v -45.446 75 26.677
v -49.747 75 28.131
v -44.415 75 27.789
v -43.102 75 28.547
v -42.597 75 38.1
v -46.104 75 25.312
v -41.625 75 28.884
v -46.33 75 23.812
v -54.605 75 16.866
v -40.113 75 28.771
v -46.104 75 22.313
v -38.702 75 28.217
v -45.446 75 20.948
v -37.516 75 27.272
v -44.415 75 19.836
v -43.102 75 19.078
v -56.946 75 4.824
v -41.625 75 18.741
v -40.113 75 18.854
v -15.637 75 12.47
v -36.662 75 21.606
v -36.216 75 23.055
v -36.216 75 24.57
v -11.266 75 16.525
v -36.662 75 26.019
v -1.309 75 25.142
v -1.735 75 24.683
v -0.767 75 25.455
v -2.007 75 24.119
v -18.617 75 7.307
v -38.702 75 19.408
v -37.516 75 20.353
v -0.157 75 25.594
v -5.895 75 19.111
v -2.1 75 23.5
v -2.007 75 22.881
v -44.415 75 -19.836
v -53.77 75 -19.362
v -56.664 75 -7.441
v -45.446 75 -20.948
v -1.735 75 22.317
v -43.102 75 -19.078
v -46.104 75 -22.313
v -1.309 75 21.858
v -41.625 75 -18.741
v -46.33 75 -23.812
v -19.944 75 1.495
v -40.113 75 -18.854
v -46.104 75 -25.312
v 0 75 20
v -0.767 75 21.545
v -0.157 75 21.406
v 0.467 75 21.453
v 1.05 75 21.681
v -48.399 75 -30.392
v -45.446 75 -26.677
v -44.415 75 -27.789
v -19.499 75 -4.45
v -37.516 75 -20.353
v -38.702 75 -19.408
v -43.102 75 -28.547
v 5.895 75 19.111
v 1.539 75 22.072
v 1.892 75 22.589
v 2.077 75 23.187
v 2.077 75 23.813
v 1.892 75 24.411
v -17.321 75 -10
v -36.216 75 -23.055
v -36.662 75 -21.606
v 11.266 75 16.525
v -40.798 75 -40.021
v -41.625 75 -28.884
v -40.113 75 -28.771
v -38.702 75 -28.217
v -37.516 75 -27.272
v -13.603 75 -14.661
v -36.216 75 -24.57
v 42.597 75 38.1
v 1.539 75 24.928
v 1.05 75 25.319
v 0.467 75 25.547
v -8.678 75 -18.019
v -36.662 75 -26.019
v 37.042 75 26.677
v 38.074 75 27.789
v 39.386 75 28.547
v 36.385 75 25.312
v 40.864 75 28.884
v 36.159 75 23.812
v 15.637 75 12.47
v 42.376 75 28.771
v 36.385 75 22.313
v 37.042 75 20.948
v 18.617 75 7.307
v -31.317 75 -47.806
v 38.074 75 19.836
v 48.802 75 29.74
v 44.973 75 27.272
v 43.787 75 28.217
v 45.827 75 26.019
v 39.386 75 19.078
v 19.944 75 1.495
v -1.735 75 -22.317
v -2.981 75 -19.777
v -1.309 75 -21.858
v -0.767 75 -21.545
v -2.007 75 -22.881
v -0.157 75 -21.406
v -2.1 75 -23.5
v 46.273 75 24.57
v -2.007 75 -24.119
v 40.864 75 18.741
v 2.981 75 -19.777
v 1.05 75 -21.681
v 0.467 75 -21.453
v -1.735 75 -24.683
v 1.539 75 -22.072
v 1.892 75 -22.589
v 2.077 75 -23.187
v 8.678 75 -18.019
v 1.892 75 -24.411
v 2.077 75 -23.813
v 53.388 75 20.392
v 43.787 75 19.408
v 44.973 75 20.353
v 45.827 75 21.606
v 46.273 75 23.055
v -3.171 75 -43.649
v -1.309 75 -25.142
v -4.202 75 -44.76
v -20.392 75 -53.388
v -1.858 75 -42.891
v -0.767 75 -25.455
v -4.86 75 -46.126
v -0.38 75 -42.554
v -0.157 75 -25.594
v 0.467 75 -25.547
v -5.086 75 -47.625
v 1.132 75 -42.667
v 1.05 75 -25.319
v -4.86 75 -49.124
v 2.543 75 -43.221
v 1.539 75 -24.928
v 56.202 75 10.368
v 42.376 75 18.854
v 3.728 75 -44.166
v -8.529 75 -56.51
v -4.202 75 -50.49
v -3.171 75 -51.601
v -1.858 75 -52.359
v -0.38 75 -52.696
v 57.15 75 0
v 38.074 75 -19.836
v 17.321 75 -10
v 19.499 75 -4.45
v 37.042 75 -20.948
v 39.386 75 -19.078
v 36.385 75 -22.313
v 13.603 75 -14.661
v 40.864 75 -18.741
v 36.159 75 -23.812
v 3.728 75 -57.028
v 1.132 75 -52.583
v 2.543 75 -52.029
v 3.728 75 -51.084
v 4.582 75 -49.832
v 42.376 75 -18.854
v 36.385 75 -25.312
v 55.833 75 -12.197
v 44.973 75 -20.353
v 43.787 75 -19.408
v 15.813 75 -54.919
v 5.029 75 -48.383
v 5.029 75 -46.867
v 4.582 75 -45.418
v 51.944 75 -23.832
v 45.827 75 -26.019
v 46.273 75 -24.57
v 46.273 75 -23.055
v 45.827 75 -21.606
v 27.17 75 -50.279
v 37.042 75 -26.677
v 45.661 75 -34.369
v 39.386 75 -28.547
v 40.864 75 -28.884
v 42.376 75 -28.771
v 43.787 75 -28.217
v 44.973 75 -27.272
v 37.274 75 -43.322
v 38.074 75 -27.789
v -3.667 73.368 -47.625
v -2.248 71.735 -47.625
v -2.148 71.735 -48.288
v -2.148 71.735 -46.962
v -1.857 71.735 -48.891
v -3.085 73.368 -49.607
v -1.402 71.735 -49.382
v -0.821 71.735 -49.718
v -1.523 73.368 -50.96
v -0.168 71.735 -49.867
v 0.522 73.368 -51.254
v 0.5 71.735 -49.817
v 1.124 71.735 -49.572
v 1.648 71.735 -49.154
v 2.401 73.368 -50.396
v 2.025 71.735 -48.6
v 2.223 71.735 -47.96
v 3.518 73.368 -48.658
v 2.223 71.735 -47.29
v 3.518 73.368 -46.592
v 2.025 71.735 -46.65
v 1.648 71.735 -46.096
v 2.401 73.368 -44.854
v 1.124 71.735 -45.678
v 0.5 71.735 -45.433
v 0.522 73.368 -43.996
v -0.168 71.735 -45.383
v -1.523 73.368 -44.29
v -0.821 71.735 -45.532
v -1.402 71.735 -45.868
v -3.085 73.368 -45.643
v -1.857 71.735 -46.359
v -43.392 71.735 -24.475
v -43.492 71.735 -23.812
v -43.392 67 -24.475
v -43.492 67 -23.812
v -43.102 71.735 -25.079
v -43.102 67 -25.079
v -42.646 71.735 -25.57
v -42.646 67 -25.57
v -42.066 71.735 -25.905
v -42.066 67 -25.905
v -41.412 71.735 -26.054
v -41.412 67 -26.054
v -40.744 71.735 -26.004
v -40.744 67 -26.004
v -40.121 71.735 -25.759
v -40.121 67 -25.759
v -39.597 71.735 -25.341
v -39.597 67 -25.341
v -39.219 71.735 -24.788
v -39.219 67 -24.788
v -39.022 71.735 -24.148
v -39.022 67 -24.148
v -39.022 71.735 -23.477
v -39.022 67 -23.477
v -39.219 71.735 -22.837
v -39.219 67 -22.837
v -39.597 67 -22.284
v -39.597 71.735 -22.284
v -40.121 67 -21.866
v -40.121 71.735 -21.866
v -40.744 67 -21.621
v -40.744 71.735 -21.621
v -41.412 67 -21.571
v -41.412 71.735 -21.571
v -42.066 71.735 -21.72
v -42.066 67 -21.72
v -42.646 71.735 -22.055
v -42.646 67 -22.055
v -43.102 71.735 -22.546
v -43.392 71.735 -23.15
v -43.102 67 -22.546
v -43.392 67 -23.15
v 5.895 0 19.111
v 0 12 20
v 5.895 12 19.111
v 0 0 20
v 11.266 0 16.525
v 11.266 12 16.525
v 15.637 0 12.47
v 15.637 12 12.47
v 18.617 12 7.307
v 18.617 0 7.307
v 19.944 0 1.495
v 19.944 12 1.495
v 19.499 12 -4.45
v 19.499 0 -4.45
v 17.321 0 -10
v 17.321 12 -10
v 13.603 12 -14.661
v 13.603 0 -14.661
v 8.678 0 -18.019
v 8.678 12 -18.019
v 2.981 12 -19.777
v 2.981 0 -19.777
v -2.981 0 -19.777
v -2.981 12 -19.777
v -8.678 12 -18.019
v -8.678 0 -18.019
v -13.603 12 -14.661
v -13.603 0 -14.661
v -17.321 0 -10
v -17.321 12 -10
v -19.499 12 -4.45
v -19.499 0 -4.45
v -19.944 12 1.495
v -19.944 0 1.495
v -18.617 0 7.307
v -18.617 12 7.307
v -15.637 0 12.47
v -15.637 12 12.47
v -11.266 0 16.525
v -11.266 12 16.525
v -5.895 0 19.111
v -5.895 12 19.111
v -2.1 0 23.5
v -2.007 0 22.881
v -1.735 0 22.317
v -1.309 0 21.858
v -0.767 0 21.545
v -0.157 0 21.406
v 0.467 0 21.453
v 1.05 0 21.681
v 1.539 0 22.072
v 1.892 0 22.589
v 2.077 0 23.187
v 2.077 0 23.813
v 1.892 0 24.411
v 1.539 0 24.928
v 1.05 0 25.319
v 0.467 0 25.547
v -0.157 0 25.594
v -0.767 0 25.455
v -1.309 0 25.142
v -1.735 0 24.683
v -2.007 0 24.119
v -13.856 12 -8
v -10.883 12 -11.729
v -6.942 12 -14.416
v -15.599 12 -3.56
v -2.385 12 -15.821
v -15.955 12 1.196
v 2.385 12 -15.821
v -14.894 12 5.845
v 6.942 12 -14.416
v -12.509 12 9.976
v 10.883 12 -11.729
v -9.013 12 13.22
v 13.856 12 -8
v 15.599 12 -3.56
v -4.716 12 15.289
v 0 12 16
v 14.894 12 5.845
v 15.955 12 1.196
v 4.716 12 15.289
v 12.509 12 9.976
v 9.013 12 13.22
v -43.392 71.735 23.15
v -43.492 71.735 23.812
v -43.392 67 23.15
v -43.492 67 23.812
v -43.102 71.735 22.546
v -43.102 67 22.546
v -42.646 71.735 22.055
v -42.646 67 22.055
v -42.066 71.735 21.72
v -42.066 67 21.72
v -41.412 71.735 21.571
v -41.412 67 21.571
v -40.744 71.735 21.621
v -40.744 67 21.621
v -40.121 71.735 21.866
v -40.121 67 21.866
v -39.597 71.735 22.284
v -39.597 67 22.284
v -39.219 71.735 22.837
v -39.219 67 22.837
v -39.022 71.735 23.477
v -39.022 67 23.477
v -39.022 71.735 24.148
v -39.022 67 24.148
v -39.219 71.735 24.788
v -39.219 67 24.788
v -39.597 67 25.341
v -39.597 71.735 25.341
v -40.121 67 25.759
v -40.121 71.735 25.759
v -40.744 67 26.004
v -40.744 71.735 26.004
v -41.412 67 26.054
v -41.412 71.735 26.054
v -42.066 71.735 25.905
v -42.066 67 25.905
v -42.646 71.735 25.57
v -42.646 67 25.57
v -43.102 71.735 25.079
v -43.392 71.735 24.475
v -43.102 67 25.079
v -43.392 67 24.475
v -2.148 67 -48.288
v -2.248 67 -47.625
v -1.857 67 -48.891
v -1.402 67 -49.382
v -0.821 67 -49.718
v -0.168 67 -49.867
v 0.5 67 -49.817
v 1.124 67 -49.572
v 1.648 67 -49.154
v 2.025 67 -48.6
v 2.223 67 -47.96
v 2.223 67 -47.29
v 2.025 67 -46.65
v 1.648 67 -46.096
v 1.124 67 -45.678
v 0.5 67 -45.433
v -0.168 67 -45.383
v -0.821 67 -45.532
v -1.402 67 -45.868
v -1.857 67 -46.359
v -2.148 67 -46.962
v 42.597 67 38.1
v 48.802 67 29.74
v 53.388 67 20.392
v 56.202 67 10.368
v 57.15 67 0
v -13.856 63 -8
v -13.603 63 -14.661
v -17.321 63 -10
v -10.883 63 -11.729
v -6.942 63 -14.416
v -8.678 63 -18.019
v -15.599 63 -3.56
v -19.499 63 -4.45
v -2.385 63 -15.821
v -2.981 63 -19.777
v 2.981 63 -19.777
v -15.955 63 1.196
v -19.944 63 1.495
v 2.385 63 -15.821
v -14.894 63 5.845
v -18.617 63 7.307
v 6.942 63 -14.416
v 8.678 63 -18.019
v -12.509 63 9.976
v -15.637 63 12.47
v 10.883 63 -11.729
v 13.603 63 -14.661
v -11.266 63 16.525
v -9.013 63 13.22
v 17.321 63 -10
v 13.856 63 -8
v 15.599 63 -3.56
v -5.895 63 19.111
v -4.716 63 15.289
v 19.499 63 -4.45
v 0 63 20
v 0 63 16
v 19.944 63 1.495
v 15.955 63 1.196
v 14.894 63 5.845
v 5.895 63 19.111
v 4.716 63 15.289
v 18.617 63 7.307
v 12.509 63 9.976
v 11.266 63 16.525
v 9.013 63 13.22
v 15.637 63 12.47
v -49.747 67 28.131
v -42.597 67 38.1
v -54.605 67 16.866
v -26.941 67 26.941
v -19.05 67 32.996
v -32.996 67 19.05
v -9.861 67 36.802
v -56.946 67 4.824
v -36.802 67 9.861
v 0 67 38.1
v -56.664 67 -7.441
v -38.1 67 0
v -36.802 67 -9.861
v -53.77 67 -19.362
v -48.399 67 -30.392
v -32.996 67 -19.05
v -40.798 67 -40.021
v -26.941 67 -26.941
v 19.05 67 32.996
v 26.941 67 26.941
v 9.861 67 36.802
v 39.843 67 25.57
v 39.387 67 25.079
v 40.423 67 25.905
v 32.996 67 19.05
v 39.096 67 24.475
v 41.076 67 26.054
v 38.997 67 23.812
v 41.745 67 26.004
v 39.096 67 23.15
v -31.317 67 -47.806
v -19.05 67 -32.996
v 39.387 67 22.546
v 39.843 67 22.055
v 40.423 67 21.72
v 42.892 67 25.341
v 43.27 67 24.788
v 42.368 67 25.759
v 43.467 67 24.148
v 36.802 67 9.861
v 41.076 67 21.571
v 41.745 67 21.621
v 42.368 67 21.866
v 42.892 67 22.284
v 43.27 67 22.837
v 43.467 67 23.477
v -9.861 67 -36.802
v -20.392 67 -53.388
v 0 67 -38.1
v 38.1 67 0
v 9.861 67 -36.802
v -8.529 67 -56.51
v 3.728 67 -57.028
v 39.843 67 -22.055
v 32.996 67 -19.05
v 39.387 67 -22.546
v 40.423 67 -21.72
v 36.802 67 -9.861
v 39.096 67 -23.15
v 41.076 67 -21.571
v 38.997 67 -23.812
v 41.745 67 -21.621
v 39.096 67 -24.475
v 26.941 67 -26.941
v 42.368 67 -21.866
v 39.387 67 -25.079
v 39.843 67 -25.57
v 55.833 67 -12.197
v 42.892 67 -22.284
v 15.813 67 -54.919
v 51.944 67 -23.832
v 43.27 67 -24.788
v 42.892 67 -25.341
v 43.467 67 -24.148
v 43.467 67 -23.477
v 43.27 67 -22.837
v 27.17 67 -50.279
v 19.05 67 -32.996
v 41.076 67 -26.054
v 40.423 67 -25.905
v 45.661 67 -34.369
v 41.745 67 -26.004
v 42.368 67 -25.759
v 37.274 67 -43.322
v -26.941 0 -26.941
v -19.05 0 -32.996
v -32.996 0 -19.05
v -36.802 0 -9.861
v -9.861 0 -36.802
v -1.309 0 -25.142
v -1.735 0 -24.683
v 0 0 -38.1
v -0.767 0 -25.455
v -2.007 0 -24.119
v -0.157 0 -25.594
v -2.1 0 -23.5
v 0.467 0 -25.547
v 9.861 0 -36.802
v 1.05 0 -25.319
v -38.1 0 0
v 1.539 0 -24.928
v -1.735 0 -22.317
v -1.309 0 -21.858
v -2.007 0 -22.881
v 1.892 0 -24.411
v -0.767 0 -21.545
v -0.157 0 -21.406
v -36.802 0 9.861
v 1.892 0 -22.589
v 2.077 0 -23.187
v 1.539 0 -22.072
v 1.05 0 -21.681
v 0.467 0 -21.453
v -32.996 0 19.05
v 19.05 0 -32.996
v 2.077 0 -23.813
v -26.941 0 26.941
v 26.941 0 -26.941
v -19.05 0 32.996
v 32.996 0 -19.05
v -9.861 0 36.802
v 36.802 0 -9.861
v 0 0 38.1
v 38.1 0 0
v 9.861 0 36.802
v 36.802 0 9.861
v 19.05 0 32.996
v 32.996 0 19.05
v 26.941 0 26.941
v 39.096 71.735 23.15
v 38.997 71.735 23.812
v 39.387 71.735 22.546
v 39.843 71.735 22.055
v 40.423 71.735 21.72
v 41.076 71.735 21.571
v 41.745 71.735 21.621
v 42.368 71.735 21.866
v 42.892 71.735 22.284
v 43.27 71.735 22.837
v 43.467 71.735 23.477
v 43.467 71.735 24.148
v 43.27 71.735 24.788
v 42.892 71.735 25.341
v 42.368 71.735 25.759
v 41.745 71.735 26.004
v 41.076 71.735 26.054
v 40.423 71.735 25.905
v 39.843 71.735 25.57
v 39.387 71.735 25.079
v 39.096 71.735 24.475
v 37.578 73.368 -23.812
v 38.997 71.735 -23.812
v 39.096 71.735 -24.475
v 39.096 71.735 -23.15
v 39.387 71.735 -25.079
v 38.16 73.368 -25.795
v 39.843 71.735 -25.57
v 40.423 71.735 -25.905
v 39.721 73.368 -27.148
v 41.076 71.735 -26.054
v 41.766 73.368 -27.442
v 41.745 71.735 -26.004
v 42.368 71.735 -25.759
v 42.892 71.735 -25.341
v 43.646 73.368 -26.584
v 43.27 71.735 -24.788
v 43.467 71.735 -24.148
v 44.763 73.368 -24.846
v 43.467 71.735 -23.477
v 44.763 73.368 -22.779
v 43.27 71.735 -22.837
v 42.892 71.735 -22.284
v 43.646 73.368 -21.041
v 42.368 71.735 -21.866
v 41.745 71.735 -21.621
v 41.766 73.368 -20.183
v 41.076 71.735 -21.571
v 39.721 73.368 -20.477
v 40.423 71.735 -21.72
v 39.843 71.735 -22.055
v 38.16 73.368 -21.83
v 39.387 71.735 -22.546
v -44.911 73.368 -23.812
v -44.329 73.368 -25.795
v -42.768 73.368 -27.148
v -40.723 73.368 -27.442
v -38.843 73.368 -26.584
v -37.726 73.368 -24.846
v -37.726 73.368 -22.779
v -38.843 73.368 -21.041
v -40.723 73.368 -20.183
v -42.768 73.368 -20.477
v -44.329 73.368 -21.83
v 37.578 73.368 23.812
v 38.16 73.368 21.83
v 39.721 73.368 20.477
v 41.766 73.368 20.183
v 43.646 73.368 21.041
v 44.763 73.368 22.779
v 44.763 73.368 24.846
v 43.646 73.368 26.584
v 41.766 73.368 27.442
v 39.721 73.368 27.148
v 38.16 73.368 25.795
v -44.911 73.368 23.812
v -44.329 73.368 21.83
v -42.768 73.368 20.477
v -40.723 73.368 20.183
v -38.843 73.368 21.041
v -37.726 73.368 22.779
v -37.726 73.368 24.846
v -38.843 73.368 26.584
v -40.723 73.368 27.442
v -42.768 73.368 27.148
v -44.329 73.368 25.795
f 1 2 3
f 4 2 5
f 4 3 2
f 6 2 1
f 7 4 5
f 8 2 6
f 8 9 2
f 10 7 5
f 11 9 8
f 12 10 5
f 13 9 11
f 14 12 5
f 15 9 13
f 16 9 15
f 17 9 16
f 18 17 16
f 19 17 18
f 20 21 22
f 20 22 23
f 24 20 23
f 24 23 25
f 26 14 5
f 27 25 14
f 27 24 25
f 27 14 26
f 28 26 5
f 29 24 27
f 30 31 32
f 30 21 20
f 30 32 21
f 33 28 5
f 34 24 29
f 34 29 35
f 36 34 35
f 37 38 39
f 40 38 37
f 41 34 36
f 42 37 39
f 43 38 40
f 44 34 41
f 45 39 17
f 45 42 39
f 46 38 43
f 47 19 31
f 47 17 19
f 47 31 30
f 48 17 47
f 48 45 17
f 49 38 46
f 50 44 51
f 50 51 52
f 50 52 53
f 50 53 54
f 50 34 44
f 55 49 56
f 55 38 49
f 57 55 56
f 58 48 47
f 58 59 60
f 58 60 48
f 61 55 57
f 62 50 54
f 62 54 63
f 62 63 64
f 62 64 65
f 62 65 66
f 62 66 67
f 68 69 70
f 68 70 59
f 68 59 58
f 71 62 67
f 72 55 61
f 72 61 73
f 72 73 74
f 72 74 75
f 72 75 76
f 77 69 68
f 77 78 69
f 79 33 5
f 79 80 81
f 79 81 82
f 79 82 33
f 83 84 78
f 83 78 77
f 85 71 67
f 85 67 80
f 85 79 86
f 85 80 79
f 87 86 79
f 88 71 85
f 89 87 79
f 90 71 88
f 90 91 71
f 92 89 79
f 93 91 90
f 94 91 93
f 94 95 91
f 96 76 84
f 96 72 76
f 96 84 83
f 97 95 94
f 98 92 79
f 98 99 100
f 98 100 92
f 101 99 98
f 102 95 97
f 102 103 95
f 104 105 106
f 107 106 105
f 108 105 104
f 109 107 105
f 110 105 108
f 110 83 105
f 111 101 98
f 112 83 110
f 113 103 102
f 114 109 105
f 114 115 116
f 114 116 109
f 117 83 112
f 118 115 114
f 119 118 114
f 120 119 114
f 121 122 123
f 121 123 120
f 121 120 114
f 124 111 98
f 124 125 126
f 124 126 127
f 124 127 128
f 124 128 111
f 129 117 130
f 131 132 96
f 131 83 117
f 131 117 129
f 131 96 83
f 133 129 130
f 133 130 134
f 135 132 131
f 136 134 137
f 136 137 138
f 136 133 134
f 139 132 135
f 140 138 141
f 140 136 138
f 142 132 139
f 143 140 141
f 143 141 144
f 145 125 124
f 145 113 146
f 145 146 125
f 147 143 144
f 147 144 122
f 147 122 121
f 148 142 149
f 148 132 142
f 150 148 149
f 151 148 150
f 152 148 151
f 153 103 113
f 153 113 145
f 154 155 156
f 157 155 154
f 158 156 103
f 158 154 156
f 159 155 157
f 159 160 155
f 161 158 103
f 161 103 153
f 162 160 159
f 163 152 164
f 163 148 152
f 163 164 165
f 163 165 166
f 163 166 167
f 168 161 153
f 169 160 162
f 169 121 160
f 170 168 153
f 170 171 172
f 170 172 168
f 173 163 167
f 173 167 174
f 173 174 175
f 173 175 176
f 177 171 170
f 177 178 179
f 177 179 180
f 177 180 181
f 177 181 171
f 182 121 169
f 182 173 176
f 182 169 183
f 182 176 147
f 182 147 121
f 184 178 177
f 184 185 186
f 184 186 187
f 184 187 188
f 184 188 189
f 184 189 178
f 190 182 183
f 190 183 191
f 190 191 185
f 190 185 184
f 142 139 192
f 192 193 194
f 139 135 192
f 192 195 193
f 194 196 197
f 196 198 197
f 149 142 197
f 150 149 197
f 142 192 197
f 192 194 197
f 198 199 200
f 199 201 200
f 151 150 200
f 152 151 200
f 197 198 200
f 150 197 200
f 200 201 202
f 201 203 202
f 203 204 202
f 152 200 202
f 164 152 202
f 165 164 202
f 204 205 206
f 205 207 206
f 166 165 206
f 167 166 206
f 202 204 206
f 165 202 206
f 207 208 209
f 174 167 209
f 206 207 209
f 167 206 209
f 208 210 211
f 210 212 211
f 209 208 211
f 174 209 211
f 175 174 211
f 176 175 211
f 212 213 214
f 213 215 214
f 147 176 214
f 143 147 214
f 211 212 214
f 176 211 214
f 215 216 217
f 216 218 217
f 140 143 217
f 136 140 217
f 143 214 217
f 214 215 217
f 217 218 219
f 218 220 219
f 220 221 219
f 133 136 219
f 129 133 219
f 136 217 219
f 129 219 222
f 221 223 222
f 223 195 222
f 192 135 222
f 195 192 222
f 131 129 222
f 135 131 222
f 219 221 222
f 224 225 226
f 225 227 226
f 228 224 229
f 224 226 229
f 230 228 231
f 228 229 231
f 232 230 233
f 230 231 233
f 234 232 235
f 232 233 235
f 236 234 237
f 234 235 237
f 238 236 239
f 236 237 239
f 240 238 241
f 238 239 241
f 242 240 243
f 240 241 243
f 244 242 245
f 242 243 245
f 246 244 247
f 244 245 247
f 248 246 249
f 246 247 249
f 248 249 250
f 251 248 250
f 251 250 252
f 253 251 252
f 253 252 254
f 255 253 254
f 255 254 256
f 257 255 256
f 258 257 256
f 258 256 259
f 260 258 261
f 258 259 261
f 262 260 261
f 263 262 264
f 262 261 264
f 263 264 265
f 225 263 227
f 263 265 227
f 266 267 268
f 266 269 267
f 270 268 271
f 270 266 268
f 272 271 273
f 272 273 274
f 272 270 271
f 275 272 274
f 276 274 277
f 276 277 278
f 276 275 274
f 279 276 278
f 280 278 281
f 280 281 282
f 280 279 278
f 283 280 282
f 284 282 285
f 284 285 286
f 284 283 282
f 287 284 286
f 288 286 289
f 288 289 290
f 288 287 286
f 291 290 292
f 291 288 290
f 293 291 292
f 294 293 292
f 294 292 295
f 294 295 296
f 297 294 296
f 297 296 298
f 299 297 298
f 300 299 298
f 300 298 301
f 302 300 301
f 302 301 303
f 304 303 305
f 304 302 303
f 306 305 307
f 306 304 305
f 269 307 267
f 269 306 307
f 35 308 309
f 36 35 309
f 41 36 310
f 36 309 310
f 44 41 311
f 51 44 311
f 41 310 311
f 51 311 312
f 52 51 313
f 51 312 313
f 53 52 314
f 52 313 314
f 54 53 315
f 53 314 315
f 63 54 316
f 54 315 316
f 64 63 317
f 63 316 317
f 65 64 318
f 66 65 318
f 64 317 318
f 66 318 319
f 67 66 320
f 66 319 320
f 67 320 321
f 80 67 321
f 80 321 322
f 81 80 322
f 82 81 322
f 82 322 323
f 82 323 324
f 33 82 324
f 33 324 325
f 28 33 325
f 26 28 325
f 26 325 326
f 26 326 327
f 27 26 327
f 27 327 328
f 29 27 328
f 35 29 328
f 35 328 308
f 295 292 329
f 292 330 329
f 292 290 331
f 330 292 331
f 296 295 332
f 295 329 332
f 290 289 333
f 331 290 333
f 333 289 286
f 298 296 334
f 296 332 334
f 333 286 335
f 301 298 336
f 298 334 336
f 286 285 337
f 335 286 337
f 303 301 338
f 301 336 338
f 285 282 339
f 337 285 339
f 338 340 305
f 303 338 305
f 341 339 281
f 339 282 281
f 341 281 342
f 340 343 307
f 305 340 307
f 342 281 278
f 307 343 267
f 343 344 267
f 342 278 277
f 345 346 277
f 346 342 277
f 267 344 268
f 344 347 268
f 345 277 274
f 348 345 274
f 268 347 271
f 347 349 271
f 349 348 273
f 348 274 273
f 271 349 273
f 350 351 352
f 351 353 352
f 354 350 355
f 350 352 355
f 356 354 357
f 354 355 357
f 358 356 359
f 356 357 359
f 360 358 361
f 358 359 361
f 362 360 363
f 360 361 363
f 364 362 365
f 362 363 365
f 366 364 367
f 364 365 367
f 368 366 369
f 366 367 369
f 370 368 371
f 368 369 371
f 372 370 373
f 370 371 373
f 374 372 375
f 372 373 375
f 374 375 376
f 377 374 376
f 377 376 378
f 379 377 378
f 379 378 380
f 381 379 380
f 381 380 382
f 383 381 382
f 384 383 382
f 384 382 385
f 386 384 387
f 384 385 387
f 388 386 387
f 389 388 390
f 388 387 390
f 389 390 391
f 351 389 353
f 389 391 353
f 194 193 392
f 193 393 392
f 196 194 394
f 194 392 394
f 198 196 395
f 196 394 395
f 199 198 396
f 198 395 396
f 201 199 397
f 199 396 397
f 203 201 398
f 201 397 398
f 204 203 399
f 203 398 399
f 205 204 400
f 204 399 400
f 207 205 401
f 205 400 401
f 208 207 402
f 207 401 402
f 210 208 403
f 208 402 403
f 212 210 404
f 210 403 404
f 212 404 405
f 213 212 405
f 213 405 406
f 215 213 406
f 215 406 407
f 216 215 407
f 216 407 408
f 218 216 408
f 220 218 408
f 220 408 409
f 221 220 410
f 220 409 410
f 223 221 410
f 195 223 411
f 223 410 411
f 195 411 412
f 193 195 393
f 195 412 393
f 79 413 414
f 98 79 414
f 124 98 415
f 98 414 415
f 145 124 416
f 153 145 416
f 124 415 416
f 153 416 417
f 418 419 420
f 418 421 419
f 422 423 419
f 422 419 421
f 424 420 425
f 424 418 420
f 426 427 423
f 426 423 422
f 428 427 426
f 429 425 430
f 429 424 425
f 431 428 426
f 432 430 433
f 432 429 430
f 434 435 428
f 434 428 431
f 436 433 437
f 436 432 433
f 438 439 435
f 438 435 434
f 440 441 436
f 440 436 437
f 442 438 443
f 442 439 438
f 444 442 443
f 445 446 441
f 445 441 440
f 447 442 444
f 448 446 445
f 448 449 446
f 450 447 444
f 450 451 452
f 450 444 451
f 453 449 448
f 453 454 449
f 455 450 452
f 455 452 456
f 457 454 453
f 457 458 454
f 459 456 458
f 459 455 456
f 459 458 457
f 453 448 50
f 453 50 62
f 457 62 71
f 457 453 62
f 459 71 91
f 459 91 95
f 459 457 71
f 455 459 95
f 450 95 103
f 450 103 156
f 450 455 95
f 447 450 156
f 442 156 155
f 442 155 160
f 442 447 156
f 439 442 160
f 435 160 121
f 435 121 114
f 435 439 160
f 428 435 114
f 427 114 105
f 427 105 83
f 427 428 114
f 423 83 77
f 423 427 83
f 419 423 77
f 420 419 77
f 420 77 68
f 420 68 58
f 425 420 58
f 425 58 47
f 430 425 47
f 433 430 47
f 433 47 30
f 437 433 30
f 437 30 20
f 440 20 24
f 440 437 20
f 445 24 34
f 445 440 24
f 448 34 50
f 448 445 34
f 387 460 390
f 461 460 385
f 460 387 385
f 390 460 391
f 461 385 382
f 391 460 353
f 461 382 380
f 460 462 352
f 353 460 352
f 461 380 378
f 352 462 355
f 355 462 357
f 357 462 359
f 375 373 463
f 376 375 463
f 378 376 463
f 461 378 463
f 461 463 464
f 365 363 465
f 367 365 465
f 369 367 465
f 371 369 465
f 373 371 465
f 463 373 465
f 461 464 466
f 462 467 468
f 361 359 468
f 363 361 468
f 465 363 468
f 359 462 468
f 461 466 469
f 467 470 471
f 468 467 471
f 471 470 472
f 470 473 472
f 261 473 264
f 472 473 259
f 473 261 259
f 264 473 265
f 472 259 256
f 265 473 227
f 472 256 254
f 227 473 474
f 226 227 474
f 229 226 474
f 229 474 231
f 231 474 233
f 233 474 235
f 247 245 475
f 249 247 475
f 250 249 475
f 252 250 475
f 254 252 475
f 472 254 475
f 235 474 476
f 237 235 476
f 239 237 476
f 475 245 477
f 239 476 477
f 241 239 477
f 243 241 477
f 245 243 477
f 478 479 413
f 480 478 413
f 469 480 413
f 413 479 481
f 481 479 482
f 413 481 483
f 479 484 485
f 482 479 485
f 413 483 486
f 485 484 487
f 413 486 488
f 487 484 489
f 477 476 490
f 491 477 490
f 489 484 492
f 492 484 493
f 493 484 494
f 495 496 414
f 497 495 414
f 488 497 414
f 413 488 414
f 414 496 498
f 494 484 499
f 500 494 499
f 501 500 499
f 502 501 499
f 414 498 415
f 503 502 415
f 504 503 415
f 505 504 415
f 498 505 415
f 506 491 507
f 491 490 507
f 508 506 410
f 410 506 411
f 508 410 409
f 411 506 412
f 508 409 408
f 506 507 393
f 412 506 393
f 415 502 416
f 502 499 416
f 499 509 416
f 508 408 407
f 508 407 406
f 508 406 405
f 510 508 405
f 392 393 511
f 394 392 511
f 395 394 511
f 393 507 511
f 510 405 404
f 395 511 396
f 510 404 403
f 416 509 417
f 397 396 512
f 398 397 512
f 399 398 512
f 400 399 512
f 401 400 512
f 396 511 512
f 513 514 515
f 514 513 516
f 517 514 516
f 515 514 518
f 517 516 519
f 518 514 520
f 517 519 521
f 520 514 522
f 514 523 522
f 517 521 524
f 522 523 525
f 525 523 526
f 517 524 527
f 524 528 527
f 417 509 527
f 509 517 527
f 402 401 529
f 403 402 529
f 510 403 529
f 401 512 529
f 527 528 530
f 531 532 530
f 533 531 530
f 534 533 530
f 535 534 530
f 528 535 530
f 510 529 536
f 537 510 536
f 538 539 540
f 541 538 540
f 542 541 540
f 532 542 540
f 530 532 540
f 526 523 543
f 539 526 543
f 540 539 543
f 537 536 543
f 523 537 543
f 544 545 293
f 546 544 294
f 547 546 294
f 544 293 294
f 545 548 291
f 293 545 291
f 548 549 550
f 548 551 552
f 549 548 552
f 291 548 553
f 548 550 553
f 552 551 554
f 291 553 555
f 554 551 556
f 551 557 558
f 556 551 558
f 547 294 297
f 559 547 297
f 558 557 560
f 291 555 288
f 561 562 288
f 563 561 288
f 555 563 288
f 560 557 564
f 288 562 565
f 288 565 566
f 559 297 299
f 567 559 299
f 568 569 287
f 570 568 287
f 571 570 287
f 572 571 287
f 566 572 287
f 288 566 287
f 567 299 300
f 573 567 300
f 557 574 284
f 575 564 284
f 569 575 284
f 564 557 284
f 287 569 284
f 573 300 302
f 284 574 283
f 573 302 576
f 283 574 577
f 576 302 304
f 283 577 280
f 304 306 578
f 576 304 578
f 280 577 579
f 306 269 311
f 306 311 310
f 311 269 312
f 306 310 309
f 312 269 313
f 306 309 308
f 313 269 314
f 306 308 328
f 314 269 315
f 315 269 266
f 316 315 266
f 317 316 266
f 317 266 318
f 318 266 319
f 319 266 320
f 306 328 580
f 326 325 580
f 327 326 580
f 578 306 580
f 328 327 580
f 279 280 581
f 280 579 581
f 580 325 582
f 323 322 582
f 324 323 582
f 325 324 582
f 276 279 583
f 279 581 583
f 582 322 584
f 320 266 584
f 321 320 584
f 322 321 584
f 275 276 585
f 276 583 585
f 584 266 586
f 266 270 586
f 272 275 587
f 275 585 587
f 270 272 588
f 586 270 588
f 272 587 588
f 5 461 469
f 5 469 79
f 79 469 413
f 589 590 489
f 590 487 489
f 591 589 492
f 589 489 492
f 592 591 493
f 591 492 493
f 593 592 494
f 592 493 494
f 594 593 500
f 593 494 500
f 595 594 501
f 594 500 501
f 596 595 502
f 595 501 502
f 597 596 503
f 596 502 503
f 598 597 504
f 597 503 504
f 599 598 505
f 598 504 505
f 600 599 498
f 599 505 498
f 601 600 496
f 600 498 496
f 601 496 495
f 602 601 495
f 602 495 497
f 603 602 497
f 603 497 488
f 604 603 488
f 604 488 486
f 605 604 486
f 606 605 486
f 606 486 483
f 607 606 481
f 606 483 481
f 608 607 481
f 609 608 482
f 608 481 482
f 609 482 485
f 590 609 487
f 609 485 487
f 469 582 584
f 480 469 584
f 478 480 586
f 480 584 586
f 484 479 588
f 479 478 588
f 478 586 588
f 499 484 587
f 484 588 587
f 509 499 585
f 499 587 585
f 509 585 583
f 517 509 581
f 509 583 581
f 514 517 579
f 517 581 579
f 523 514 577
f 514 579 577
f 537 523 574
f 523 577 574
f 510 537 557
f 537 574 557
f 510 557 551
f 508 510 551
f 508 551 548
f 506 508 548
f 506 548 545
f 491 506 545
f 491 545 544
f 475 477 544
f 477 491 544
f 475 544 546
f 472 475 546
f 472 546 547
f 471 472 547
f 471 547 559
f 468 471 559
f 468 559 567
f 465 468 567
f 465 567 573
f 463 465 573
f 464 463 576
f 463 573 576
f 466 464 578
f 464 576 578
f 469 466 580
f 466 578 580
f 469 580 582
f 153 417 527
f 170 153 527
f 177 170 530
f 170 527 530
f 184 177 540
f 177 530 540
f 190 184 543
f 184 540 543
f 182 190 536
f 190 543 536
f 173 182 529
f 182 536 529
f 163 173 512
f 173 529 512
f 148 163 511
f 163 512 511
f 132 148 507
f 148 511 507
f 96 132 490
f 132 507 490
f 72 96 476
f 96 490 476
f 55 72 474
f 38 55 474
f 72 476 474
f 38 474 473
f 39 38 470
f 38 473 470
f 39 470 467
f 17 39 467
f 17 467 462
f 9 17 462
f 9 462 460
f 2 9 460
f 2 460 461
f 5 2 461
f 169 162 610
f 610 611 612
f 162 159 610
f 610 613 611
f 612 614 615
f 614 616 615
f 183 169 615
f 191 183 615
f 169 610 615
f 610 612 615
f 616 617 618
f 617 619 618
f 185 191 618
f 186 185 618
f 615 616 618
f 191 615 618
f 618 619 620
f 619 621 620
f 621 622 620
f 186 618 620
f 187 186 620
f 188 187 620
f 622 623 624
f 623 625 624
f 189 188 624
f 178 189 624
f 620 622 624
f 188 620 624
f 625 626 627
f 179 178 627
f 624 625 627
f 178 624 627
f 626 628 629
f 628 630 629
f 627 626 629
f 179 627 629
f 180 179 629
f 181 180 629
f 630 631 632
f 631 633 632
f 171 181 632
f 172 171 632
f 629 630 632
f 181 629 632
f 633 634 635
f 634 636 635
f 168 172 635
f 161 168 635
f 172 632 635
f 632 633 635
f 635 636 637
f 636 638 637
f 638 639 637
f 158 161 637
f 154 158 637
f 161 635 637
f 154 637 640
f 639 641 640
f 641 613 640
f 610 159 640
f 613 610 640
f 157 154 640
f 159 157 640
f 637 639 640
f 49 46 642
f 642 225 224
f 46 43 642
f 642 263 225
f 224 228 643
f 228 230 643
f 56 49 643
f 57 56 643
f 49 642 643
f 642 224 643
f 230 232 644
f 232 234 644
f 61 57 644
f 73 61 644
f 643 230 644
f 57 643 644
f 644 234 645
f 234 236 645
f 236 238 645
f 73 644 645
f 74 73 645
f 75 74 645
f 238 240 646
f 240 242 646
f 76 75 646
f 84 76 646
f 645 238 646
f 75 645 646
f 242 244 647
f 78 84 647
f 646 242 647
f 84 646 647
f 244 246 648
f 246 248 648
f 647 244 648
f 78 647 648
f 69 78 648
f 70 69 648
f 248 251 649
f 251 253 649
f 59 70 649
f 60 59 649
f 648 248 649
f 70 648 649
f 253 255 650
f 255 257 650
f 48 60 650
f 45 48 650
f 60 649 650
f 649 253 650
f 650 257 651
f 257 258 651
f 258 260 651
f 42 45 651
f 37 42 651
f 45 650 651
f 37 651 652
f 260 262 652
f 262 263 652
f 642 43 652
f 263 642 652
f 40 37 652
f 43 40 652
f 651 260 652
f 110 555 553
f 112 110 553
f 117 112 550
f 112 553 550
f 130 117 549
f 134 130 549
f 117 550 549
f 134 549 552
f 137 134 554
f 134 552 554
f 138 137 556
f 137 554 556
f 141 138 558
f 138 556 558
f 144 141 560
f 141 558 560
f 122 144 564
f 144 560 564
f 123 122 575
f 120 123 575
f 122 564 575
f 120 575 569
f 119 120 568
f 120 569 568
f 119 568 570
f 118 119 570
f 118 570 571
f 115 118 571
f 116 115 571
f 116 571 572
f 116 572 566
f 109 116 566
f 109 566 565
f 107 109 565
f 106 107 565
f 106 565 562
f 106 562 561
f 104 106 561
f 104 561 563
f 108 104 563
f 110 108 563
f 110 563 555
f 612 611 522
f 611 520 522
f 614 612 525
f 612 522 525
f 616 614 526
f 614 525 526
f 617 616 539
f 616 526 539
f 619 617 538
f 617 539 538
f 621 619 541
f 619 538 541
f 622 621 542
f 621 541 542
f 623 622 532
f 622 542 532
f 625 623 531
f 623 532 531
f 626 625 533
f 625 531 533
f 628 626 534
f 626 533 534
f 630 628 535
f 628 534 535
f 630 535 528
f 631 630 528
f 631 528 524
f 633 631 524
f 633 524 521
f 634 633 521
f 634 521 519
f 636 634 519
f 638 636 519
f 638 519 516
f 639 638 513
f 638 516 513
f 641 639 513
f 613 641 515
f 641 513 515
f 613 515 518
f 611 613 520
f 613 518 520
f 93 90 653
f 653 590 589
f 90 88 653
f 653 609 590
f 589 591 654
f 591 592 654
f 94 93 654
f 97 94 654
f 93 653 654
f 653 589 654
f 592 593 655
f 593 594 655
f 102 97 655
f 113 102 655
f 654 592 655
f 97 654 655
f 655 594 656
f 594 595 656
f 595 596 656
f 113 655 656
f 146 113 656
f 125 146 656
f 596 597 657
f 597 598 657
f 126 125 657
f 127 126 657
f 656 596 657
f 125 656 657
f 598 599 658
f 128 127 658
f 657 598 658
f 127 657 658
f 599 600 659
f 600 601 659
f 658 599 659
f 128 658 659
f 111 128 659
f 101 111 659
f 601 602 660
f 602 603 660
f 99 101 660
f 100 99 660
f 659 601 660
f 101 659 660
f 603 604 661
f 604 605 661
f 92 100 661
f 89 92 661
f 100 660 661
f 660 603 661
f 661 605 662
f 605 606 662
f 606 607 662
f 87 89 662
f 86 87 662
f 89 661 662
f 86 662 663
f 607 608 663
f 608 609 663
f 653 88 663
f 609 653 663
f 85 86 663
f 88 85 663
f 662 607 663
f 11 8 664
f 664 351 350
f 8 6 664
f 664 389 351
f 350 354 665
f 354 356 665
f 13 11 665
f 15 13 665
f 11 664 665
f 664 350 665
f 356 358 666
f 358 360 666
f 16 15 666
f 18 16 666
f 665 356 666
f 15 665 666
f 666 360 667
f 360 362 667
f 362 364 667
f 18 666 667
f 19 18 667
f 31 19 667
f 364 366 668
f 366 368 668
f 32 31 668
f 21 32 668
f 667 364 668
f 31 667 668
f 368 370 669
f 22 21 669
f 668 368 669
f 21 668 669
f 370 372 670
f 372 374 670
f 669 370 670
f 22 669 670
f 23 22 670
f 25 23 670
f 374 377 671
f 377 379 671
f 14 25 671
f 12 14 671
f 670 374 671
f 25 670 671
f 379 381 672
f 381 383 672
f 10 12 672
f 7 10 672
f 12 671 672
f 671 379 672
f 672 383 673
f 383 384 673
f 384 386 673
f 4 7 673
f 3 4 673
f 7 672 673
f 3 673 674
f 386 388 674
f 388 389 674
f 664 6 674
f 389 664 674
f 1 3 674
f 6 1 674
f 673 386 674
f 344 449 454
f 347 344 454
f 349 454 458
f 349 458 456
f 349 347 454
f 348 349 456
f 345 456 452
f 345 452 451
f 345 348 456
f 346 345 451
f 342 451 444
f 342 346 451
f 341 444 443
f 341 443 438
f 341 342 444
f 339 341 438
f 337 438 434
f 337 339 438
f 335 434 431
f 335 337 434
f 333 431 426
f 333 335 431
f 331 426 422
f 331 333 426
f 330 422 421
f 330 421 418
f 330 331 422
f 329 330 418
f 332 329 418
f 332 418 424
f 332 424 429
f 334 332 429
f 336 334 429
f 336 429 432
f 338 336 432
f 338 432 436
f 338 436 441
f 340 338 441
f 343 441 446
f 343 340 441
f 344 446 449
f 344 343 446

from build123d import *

# Parameters (mm, degrees)
SKETCH1_R                                      = 38.1
SKETCH1_R_2                                    = 20
BOSS_EXTRUDE1_DEPTH                            = 75
BOSS_EXTRUDE2_START                            = -8
SKETCH2_R                                      = 38.1
SKETCH2_R_2                                    = 20
BOSS_EXTRUDE2_DEPTH                            = 8
CSK_FOR_8_FLAT_HEAD_MACHINE_SCREW2_D           = 4.4958
CSK_FOR_8_FLAT_HEAD_MACHINE_SCREW2_CSINK_D     = 10.1713792
CSK_FOR_8_FLAT_HEAD_MACHINE_SCREW2_CSINK_ANGLE = 82
BOSS_EXTRUDE3_START                            = -63
SKETCH5_R                                      = 20
SKETCH5_R_2                                    = 16
BOSS_EXTRUDE3_DEPTH                            = 51
TAP_DRILL_FOR_M5X0_8_TAP1_D                    = 4.2


with BuildPart() as part:
    # Sketch1 → Boss-Extrude1 (new body)
    with BuildSketch(Plane(origin=(0, 0, 0), x_dir=(1, 0, 0), z_dir=(0, 1, 0))):
        with Locations(Location((0, 0, 0), (0, 0, 270))):
            Circle(SKETCH1_R)
        with Locations(Location((0, 0, 0), (0, 0, 270))):
            Circle(SKETCH1_R_2, mode=Mode.SUBTRACT)
    extrude(amount=BOSS_EXTRUDE1_DEPTH)

    # Sketch2 → Boss-Extrude2 (add)
    # profile 1 of 2: a face of its own
    with BuildSketch(Plane(origin=(0, 75, 0), x_dir=(1, 0, 0), z_dir=(0, 1, 0)).offset(BOSS_EXTRUDE2_START)):
        with BuildLine():
            ThreePointArc((57.15, 0), (-20.392382431, 53.387950315), (-42.597094971, -38.1))
            Line((-42.597094971, -38.1), (0, -38.1))
            Line((0, -38.1), (42.597094971, -38.1))
            ThreePointArc((42.597094971, -38.1), (53.387950315, -20.392382431), (57.15, 0))
        make_face()
        with BuildLine():
            ThreePointArc((38.1, 0), (26.940768363, -26.940768363), (0, -38.1))
            ThreePointArc((0, -38.1), (-26.940768363, 26.940768363), (38.1, 0))
        make_face(mode=Mode.SUBTRACT)
    # profile 2 of 2: a face of its own
    with BuildSketch(Plane(origin=(0, 75, 0), x_dir=(1, 0, 0), z_dir=(0, 1, 0)).offset(BOSS_EXTRUDE2_START)):
        with Locations(Location((0, 0, 0), (0, 0, 270))):
            Circle(SKETCH2_R)
        with Locations(Location((0, 0, 0), (0, 0, 270))):
            Circle(SKETCH2_R_2, mode=Mode.SUBTRACT)
    extrude(amount=BOSS_EXTRUDE2_DEPTH)

    # CSK for #8 Flat Head Machine Screw2 (through all)
    with Locations(Plane(origin=(0, 75, 0), x_dir=(1, 0, 0), z_dir=(0, 1, 0))):
        with Locations((-41.244459855, -23.8125), (-41.244459855, 23.8125), (0, 47.625), (41.244459855, 23.8125), (41.244459855, -23.8125), (0, -47.625)):
            CounterSinkHole(CSK_FOR_8_FLAT_HEAD_MACHINE_SCREW2_D / 2, CSK_FOR_8_FLAT_HEAD_MACHINE_SCREW2_CSINK_D / 2, counter_sink_angle=CSK_FOR_8_FLAT_HEAD_MACHINE_SCREW2_CSINK_ANGLE)

    # Sketch5 → Boss-Extrude3 (add)
    with BuildSketch(Plane(origin=(0, 75, 0), x_dir=(1, 0, 0), z_dir=(0, 1, 0)).offset(BOSS_EXTRUDE3_START)):
        with Locations(Location((0, 0, 0), (0, 0, 270))):
            Circle(SKETCH5_R)
        with Locations(Location((0, 0, 0), (0, 0, 270))):
            Circle(SKETCH5_R_2, mode=Mode.SUBTRACT)
    extrude(amount=BOSS_EXTRUDE3_DEPTH)

    # Tap Drill for M5x0.8 Tap1 (through all)
    with Locations(Plane(origin=(0, 75, 0), x_dir=(1, 0, 0), z_dir=(0, 1, 0))):
        with Locations((0, 23.5), (0, -23.5)):
            Hole(TAP_DRILL_FOR_M5X0_8_TAP1_D / 2)


solid = part.part
